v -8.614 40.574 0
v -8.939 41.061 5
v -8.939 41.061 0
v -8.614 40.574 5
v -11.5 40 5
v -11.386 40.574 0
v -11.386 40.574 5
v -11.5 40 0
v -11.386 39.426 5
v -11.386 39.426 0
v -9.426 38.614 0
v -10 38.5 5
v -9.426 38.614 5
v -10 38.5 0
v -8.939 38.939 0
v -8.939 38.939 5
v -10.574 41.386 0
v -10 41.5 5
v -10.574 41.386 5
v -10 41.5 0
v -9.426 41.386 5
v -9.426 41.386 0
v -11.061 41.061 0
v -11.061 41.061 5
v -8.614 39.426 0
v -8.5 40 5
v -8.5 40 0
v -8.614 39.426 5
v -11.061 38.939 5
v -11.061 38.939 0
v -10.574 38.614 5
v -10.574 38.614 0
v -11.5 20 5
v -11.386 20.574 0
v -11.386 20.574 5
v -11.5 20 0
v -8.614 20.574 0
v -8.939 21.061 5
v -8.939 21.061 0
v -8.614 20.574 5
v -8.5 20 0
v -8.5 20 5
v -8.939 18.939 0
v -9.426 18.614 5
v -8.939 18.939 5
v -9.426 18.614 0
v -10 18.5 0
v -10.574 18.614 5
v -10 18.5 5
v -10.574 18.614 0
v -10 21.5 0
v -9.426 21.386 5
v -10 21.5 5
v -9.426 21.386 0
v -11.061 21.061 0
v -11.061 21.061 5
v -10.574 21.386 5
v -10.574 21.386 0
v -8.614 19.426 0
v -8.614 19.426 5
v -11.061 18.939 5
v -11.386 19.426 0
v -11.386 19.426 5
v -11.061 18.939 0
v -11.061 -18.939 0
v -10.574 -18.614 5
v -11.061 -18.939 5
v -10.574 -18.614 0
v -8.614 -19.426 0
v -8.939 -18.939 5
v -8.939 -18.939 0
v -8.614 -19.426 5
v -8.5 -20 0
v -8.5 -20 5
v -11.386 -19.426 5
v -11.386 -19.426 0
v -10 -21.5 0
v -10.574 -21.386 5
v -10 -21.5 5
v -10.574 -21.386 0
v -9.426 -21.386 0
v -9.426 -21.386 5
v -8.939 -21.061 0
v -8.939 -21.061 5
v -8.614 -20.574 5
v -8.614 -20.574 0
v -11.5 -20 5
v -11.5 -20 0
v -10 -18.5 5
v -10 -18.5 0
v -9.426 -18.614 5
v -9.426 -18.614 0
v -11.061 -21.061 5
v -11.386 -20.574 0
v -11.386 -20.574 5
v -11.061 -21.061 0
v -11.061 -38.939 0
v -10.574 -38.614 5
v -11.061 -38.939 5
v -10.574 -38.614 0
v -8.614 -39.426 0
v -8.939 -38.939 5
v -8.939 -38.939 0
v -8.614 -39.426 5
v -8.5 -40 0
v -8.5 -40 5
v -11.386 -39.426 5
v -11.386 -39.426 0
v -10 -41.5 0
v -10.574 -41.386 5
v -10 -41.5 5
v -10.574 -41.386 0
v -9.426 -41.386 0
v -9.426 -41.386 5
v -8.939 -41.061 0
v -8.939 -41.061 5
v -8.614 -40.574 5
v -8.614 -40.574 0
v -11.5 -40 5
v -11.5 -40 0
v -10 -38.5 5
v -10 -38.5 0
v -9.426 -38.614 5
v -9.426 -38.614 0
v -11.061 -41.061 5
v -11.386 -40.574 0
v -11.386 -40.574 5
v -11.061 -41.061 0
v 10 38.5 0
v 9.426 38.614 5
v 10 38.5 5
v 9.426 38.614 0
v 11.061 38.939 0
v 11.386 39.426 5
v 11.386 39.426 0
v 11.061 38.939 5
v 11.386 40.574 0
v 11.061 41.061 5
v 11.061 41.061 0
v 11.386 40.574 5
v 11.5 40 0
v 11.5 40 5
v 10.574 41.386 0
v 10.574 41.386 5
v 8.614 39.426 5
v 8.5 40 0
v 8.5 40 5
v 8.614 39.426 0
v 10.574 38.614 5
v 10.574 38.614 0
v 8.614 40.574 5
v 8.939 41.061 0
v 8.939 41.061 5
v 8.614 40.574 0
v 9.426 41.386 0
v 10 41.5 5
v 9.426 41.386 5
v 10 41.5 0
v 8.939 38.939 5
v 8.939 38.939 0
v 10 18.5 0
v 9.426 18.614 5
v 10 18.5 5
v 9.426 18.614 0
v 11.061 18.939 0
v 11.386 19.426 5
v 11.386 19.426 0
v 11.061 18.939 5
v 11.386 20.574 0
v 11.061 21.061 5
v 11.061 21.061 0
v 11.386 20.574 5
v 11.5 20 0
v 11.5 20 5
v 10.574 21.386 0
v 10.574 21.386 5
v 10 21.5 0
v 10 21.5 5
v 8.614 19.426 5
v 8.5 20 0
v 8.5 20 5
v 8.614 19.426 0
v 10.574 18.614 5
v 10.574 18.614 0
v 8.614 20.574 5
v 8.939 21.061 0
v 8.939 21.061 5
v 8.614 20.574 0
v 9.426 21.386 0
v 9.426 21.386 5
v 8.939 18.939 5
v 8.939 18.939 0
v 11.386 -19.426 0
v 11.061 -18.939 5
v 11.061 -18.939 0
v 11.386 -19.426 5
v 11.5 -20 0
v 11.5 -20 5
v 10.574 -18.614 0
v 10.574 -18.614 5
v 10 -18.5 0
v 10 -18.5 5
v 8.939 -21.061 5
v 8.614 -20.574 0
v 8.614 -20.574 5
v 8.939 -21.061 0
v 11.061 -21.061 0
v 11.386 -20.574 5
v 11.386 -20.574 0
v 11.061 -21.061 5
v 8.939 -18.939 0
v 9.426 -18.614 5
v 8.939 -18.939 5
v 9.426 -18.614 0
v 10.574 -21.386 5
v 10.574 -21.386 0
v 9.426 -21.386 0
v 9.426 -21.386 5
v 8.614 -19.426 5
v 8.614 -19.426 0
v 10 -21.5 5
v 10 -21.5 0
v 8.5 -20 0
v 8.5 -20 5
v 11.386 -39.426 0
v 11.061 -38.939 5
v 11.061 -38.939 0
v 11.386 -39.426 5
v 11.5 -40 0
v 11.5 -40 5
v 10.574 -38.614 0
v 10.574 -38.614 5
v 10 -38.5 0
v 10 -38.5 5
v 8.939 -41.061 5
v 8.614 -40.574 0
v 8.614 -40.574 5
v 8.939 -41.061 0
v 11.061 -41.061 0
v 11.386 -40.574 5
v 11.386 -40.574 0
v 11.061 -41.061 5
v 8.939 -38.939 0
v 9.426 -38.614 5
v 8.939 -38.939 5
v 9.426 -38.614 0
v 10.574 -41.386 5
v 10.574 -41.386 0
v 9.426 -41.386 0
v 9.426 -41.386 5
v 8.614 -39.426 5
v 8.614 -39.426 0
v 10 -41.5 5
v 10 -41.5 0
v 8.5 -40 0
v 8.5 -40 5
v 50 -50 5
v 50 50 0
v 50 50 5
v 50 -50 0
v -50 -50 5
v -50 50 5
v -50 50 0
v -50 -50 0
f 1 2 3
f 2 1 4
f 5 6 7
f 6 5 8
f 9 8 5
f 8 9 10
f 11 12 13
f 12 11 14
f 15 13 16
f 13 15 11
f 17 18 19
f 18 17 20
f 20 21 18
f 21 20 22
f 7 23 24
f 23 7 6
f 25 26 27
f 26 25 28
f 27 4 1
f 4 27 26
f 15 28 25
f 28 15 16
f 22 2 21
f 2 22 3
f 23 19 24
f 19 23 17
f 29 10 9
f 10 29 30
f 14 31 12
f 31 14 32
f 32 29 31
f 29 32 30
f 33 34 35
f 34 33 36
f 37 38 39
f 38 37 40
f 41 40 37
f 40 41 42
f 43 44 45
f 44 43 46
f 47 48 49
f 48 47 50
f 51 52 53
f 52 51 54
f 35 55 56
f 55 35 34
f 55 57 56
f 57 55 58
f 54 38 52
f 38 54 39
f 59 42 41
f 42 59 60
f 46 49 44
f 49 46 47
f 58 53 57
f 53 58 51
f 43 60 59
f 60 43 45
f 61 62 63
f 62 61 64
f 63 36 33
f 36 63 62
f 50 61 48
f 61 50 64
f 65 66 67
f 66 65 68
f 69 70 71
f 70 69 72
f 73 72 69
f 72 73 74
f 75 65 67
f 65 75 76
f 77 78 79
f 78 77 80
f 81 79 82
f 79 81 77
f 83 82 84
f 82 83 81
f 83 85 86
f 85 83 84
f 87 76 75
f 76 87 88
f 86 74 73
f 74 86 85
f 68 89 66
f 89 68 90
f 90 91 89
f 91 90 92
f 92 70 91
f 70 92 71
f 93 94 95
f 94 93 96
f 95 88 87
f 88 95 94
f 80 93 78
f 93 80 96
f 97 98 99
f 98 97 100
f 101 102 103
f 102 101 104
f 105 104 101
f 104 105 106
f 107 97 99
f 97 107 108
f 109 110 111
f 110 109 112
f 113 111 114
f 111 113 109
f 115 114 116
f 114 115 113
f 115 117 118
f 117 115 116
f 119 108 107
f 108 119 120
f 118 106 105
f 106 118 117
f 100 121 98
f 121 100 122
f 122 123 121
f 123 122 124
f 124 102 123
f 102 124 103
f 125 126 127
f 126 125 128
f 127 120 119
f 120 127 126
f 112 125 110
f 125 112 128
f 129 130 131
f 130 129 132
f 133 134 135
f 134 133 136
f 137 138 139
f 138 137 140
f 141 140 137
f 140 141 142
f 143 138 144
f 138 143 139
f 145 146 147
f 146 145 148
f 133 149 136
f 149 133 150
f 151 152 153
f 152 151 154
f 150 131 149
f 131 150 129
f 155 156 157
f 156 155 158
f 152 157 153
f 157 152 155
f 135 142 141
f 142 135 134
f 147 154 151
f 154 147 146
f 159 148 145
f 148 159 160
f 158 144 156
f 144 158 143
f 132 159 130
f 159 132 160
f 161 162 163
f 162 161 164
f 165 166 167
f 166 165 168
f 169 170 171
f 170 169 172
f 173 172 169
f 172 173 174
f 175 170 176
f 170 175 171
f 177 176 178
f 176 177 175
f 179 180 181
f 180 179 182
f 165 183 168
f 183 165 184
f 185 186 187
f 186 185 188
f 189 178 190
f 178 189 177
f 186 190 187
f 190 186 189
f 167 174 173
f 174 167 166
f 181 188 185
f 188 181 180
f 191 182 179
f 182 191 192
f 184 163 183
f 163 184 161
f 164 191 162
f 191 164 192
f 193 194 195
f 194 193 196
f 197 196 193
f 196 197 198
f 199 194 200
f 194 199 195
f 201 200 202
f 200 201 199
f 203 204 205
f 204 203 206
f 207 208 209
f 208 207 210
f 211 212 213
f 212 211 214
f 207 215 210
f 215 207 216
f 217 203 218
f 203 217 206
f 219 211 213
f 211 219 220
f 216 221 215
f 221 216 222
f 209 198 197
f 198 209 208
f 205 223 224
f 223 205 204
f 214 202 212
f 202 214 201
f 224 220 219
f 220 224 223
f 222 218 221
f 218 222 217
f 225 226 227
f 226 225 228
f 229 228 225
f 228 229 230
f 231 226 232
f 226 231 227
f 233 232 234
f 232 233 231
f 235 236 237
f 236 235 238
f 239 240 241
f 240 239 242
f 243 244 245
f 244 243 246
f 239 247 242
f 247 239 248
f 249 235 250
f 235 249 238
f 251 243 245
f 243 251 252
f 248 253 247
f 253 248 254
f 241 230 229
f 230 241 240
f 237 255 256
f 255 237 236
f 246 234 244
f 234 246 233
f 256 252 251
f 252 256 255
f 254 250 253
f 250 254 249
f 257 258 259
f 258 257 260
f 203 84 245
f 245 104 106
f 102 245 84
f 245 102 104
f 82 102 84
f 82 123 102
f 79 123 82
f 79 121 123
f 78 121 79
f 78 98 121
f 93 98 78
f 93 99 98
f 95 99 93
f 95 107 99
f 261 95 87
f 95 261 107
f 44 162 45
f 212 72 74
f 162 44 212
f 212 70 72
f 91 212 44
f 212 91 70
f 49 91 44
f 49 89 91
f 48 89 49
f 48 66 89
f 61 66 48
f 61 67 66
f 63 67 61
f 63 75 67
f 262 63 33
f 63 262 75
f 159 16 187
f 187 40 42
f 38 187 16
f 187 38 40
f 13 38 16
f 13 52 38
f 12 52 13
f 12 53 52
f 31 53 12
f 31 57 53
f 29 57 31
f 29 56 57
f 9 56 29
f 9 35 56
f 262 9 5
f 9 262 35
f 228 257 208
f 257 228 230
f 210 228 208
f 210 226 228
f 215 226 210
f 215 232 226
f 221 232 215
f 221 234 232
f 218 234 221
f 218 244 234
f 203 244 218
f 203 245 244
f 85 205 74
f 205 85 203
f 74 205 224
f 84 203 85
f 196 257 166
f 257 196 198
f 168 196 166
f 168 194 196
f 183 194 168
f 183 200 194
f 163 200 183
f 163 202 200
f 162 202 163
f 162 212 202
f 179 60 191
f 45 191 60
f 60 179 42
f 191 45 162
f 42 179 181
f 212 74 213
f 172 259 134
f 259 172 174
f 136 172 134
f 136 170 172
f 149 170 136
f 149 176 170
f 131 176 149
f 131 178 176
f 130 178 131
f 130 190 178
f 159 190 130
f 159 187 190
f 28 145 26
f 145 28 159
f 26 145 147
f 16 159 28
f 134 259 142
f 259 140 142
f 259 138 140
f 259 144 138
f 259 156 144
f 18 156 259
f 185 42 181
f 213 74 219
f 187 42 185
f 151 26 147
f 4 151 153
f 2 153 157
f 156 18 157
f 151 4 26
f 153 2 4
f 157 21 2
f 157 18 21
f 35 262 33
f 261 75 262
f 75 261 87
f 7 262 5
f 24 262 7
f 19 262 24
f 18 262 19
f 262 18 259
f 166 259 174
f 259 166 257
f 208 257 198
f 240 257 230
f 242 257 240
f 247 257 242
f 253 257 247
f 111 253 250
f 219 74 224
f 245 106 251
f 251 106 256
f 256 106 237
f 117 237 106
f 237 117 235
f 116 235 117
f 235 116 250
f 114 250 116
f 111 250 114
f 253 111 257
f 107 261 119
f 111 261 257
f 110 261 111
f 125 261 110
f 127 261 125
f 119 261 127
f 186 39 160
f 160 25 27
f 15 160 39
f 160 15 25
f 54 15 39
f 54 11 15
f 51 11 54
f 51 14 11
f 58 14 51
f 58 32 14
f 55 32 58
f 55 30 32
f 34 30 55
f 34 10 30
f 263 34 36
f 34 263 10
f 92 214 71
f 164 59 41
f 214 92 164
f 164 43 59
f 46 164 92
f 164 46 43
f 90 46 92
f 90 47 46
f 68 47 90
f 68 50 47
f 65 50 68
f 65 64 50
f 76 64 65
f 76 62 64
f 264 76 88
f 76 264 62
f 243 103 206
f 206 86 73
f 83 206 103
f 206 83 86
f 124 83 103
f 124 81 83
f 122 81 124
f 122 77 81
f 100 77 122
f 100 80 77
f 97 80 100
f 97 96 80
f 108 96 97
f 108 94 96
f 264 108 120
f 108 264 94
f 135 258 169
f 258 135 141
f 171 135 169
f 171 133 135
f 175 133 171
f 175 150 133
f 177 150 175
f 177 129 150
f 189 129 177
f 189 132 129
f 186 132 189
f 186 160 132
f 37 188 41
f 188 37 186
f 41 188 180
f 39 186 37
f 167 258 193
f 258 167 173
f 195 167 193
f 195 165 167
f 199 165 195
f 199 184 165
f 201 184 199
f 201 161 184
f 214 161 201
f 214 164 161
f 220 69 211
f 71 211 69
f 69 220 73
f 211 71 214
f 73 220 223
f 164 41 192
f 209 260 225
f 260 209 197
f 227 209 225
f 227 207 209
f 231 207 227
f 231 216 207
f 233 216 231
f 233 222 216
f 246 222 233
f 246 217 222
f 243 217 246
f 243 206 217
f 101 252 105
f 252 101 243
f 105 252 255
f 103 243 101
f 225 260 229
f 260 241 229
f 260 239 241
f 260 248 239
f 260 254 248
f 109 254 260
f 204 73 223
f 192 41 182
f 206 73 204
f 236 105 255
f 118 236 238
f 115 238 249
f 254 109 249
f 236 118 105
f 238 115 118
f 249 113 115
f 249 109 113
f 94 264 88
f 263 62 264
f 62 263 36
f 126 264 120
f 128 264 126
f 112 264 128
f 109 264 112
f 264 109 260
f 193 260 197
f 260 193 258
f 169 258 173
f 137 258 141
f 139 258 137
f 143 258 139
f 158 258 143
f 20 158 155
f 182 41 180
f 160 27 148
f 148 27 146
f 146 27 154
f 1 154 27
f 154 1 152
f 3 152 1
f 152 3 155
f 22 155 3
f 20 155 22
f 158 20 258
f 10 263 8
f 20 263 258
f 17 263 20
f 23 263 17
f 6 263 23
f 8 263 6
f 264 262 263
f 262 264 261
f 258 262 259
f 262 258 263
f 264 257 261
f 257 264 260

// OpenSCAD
module side_plate(){
    
    color("gray")
    translate([-50,0,0])
    cube([100,300,5]);
}

module z_axis_mount_plate(){
    color("grey")
    difference(){
        translate([-50, -50,0])
        cube([100,100,5]);
    
        // M3 mount
        for (dx = [-10, 10]){
            for ( dy = [30,10, -10, -30]){
                translate([dx, dy, 0])
                cylinder(d= 3, h = 50, center =true, $fn=16);
            }
        }
    }
}

module spindle_mount_plate(){
    
    color("grey")
    difference(){
        translate([-50, -50,0])
        cube([100,100,5]);
    
        // M3 mount
        for (dx = [-10, 10]){
            for ( dy = [40,20, -20, -40]){
                translate([dx, dy, 0])
                cylinder(d= 3, h = 50, center =true, $fn=16);
            }
        }
    }
}


//side_plate();
//z_axis_mount_plate();
spindle_mount_plate();
